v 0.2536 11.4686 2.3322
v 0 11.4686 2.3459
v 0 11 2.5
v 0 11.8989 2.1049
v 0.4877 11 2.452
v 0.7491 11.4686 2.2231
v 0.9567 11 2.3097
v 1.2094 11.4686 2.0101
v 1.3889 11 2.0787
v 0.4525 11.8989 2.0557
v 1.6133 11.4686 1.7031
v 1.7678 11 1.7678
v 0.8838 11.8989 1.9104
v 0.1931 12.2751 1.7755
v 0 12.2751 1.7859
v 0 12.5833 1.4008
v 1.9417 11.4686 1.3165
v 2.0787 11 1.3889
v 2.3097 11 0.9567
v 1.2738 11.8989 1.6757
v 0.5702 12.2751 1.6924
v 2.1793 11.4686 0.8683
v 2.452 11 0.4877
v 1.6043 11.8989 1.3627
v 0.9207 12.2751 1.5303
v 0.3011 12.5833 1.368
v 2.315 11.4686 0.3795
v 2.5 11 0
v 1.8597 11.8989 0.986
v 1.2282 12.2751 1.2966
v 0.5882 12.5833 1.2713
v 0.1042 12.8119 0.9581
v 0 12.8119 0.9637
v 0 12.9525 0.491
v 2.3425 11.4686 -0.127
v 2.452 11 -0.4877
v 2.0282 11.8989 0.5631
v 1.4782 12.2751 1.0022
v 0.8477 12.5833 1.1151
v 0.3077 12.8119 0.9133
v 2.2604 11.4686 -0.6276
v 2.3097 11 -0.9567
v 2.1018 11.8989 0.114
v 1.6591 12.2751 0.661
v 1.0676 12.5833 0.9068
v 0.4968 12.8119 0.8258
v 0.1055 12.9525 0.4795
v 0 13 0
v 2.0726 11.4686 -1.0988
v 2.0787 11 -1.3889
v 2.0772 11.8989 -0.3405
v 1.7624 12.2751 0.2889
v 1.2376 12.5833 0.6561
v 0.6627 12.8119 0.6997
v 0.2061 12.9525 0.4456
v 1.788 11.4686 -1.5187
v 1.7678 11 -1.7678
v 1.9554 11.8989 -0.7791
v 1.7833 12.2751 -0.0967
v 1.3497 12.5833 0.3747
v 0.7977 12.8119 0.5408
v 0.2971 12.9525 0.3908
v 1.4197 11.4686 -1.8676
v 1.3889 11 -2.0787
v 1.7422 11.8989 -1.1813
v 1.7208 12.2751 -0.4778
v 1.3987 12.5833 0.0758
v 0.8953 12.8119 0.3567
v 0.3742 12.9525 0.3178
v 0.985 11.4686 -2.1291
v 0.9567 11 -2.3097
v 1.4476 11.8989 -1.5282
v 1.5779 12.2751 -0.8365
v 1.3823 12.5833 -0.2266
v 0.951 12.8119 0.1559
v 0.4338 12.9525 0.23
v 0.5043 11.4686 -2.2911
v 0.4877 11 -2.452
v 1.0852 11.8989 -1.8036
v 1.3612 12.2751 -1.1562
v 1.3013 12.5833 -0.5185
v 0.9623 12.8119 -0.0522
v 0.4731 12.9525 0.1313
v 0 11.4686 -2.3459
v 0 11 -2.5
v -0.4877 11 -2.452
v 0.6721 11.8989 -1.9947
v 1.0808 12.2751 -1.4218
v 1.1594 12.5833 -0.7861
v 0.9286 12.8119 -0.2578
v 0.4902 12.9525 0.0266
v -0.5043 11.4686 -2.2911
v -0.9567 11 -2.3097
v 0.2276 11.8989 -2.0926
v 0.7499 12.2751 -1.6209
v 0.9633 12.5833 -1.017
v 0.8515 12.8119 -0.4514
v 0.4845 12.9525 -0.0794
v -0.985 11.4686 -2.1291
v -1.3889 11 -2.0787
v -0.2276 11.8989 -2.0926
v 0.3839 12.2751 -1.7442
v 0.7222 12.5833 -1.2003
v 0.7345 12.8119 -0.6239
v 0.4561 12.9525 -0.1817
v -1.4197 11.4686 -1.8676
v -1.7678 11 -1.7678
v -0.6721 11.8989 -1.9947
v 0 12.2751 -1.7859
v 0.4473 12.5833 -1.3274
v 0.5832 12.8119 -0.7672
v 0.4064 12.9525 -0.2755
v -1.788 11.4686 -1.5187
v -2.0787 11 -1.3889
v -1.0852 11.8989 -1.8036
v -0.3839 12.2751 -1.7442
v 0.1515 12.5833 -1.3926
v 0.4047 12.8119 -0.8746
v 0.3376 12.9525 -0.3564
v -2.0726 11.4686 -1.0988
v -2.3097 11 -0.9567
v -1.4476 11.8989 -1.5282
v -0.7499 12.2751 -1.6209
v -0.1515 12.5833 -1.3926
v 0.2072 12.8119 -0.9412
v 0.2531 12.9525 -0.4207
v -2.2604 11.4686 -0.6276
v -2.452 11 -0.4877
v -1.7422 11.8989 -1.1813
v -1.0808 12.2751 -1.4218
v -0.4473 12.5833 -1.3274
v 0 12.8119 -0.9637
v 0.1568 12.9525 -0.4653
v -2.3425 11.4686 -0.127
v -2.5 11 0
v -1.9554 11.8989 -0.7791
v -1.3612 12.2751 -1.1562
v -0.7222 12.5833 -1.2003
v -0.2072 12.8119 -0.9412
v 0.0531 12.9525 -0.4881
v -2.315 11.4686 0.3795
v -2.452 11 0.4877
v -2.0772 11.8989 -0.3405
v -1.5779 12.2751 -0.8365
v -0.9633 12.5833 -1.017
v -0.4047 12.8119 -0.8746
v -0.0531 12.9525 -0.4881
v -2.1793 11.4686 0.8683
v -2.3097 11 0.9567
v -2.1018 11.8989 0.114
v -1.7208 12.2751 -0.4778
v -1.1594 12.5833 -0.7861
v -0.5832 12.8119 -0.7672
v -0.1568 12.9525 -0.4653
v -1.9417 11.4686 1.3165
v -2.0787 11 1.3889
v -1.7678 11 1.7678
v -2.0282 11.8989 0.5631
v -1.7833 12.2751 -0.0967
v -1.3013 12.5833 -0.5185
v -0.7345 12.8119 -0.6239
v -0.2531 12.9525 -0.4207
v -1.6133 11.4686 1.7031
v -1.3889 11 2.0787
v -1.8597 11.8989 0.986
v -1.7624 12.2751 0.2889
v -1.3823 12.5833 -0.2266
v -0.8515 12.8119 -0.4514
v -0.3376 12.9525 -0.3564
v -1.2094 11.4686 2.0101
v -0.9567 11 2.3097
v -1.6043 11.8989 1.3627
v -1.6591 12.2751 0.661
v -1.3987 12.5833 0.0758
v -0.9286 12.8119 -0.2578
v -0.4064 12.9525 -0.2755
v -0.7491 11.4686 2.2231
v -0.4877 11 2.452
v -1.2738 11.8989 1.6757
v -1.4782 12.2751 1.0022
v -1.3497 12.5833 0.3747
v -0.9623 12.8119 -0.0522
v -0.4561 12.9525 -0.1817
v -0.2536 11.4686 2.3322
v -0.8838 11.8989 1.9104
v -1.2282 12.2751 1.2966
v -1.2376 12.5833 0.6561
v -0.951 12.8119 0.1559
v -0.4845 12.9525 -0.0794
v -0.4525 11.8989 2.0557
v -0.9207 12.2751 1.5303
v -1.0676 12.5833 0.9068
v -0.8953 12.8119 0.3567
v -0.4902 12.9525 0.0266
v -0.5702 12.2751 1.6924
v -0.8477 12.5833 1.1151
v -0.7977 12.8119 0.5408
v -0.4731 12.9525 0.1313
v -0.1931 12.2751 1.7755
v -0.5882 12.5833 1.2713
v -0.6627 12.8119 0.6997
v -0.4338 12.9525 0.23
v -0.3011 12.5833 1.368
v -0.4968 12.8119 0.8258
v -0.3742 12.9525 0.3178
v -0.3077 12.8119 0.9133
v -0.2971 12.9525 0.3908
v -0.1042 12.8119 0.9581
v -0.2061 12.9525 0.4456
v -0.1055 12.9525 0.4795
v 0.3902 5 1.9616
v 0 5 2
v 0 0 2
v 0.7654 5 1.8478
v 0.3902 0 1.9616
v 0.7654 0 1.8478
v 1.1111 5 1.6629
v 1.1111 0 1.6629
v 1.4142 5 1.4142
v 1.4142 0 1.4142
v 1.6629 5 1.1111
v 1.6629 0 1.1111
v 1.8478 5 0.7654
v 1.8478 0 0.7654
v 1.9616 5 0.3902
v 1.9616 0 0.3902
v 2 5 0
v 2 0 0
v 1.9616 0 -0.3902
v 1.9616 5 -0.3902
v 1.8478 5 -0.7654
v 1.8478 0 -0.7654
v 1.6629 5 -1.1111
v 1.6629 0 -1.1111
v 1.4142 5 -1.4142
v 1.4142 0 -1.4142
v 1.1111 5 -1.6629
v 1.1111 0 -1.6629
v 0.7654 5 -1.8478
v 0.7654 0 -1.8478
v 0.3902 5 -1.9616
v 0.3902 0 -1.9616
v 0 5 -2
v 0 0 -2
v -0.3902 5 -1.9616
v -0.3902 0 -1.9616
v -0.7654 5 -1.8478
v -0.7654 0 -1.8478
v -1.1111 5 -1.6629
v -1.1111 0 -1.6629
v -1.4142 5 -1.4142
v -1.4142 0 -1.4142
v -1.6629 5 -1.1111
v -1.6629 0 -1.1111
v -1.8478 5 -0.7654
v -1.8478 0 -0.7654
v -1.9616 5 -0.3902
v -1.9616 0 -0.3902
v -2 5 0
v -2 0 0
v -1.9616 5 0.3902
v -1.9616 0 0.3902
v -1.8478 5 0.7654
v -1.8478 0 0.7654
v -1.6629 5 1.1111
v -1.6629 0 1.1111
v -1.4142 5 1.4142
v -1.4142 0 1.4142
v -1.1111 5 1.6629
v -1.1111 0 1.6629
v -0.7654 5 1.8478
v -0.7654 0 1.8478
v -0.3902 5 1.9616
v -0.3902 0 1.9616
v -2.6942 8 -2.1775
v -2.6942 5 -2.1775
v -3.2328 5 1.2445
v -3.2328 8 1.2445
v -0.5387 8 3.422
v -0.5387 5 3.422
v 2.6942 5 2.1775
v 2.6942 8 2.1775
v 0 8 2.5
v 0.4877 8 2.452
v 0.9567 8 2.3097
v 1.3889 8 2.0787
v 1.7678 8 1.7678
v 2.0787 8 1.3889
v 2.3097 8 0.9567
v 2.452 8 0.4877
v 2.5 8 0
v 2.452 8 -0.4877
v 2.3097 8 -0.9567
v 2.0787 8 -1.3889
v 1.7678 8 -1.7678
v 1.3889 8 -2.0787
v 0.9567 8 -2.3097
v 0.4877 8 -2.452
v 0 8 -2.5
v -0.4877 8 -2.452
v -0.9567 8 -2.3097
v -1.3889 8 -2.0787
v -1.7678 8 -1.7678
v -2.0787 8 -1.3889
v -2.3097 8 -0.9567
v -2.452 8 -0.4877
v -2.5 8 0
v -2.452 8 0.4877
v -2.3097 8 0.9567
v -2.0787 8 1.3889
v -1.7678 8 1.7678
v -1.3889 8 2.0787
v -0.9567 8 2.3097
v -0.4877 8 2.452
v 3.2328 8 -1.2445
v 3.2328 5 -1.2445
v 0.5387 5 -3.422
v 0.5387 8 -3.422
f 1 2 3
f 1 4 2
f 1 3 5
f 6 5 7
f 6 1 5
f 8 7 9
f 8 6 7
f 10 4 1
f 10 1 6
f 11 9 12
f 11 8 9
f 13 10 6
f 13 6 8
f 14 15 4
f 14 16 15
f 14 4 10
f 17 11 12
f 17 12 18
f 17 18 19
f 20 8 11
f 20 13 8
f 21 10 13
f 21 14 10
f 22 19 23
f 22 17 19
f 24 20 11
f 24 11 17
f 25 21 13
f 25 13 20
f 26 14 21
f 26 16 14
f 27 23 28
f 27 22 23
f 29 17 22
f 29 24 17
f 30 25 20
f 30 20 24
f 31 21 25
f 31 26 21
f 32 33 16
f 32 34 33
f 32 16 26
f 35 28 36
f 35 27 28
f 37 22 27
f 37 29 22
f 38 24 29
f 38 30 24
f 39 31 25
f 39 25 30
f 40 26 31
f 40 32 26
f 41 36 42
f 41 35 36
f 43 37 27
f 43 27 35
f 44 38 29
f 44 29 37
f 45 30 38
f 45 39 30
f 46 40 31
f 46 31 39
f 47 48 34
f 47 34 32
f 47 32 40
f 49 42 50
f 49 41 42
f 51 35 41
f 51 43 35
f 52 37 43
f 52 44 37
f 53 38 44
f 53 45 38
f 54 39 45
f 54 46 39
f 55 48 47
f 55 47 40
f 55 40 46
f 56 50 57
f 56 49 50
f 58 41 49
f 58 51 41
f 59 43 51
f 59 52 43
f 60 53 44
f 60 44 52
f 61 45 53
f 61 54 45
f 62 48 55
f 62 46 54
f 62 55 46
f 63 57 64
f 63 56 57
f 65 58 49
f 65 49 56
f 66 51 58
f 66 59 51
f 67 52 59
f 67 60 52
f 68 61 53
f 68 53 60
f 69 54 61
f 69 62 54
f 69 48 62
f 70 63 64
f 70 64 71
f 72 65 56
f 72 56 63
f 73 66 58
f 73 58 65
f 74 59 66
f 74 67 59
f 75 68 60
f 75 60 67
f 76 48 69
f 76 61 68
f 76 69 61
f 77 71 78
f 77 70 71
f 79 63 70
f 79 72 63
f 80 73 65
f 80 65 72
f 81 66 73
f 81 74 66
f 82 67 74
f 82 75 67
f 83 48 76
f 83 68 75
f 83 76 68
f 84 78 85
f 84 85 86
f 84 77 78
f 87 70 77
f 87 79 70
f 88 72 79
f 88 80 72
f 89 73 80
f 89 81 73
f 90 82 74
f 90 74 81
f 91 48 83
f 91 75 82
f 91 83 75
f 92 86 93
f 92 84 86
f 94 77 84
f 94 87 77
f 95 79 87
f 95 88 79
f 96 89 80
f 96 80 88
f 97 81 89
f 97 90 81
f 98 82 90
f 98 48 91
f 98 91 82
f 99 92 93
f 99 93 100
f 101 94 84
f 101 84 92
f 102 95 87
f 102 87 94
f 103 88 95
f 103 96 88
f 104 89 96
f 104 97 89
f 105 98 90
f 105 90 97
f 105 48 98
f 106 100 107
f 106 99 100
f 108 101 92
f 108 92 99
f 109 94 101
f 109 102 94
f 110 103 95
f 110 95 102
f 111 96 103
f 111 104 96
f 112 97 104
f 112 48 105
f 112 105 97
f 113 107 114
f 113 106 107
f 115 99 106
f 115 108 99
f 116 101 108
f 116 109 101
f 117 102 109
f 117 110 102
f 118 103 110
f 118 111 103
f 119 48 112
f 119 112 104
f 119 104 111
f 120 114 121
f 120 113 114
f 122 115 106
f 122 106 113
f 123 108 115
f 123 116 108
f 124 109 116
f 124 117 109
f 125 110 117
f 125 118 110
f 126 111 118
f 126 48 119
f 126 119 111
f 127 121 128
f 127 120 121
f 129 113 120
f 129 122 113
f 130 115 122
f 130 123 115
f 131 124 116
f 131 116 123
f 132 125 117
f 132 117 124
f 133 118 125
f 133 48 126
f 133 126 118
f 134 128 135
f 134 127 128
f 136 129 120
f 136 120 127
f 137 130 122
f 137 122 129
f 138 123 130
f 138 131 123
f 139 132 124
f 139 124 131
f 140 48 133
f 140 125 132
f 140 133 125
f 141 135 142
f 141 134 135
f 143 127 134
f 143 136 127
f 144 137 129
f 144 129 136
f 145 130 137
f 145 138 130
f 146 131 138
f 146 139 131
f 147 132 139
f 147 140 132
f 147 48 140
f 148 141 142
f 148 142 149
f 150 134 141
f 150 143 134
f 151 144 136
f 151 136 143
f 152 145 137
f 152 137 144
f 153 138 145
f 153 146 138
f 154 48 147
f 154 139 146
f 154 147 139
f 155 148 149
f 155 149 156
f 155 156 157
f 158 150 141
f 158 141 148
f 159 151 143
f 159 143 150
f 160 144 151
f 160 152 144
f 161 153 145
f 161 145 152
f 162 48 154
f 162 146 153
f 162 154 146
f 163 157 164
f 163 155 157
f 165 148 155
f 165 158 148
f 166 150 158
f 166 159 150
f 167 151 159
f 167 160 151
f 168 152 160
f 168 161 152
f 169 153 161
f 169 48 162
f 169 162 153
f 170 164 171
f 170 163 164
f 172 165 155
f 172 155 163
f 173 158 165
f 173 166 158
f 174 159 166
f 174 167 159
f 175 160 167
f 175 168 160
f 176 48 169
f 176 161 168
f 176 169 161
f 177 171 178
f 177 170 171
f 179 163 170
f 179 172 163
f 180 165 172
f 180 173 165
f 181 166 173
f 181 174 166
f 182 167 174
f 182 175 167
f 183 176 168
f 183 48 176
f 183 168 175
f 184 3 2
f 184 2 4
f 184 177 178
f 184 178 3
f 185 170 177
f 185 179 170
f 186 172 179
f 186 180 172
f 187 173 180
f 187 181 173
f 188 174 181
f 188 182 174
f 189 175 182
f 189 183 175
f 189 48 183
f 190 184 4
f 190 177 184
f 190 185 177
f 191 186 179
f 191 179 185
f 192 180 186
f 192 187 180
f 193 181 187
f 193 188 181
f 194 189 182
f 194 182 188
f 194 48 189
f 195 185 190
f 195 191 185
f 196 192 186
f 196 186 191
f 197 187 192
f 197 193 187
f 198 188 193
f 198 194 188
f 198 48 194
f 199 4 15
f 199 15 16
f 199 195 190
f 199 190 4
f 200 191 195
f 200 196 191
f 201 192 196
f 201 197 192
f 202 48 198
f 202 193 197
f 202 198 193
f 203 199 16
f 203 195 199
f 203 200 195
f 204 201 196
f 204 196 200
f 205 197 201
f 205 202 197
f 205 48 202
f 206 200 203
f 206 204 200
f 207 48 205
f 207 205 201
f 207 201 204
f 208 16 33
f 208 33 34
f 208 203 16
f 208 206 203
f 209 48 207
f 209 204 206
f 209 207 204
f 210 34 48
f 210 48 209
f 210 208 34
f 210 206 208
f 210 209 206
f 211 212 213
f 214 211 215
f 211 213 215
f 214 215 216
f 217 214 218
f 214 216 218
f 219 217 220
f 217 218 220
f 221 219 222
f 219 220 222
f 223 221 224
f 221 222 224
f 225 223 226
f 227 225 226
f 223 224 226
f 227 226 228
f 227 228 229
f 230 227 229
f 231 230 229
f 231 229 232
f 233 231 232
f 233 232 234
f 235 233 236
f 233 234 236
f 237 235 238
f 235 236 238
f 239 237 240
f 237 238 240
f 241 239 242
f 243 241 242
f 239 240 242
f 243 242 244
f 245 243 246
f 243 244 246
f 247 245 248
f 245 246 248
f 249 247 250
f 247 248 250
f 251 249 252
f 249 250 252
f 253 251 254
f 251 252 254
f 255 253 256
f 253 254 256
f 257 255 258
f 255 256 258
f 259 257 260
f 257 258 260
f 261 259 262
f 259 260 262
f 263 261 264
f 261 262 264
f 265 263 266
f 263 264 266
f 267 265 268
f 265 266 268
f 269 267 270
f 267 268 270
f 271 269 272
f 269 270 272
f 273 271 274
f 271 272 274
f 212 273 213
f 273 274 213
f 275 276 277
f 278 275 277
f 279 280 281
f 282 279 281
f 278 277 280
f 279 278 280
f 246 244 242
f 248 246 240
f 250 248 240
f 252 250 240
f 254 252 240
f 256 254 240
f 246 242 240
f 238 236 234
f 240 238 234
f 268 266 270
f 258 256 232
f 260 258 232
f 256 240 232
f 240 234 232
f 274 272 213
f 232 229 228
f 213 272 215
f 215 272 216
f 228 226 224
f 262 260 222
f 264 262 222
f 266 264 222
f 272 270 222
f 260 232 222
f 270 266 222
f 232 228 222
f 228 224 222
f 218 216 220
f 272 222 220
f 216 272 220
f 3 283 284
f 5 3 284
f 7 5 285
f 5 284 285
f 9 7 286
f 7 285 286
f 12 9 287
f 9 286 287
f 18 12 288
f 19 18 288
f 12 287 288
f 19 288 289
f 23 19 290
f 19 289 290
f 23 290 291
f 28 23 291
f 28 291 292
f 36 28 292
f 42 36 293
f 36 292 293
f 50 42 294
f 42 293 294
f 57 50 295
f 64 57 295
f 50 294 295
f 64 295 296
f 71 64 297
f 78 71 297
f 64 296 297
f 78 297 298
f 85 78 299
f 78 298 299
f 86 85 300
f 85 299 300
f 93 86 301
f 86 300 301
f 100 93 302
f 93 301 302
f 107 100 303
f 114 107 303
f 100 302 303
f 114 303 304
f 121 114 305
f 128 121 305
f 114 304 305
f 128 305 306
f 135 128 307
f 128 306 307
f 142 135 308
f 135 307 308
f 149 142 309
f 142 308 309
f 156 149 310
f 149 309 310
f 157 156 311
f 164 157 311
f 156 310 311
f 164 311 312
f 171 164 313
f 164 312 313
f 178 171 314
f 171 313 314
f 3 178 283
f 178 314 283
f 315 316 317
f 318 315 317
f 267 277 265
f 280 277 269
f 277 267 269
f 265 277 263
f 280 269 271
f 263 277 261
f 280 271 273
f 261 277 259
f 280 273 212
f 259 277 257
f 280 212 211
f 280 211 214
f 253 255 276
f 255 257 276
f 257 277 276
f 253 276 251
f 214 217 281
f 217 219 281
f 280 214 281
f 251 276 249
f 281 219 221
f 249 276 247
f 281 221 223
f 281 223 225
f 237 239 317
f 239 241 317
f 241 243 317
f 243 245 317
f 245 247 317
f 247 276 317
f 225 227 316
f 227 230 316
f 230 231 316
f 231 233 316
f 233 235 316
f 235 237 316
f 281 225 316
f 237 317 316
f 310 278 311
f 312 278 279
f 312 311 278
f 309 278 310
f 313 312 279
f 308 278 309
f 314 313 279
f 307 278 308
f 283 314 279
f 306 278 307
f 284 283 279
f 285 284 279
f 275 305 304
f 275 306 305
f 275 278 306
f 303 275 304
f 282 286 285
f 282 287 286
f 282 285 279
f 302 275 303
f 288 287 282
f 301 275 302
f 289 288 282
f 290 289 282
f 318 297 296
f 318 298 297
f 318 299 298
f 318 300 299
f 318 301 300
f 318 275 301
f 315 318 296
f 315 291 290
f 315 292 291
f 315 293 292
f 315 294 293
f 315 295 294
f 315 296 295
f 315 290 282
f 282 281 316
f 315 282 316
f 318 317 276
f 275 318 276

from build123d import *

# Parameters (mm, degrees)
IZIM1_R                     = 2
Y_KSEKLIK_EKSTR_ZYON1_DEPTH = 5
Y_KSEKLIK_EKSTR_ZYON2_DEPTH = 3
IZIM3_R                     = 2.5
Y_KSEKLIK_EKSTR_ZYON3_DEPTH = 3
KUBBE1_FACE_RADIUS          = 2.5
KUBBE1_HEIGHT               = 2


with BuildPart() as part:
    # Çizim1 → Yükseklik-Ekstrüzyon1 (new body)
    with BuildSketch(Plane(origin=(0, 0, 0), x_dir=(1, 0, 0), z_dir=(0, 1, 0))):
        with Locations(Location((0, 0, 0), (0, 0, 270))):
            Circle(IZIM1_R)
    extrude(amount=Y_KSEKLIK_EKSTR_ZYON1_DEPTH)

    # Çizim2 → Yükseklik-Ekstrüzyon2 (add)
    with BuildSketch(Plane(origin=(0, 5, 0), x_dir=(1, 0, 0), z_dir=(0, 1, 0))):
        Polygon((2.694173307, -2.177482536), (3.232841846, 1.244481258), (0.538668539, 3.421963794), (-2.694173307, 2.177482536), (-3.232841846, -1.244481258), (-0.538668539, -3.421963794), align=None)
    extrude(amount=Y_KSEKLIK_EKSTR_ZYON2_DEPTH)

    # Çizim3 → Yükseklik-Ekstrüzyon3 (add)
    with BuildSketch(Plane(origin=(0, 8, 0), x_dir=(1, 0, 0), z_dir=(0, 1, 0))):
        with Locations(Location((0, 0, 0), (0, 0, 270))):
            Circle(IZIM3_R)
    extrude(amount=Y_KSEKLIK_EKSTR_ZYON3_DEPTH)

    # Kubbe1: a dome of height H over a round flat face of radius A is a cap of a sphere of radius (A * A + H * H) / (2 * H)
    kubbe1_r = (KUBBE1_FACE_RADIUS * KUBBE1_FACE_RADIUS + KUBBE1_HEIGHT * KUBBE1_HEIGHT) / (2 * KUBBE1_HEIGHT)
    kubbe1_base = Plane((0, 11, 0), z_dir=(0, 1, 0))
    with Locations(kubbe1_base.offset(KUBBE1_HEIGHT - kubbe1_r)):
        kubbe1_ball = Sphere(kubbe1_r, mode=Mode.PRIVATE)
    add(split(kubbe1_ball, bisect_by=kubbe1_base, keep=Keep.TOP, mode=Mode.PRIVATE))


solid = part.part
